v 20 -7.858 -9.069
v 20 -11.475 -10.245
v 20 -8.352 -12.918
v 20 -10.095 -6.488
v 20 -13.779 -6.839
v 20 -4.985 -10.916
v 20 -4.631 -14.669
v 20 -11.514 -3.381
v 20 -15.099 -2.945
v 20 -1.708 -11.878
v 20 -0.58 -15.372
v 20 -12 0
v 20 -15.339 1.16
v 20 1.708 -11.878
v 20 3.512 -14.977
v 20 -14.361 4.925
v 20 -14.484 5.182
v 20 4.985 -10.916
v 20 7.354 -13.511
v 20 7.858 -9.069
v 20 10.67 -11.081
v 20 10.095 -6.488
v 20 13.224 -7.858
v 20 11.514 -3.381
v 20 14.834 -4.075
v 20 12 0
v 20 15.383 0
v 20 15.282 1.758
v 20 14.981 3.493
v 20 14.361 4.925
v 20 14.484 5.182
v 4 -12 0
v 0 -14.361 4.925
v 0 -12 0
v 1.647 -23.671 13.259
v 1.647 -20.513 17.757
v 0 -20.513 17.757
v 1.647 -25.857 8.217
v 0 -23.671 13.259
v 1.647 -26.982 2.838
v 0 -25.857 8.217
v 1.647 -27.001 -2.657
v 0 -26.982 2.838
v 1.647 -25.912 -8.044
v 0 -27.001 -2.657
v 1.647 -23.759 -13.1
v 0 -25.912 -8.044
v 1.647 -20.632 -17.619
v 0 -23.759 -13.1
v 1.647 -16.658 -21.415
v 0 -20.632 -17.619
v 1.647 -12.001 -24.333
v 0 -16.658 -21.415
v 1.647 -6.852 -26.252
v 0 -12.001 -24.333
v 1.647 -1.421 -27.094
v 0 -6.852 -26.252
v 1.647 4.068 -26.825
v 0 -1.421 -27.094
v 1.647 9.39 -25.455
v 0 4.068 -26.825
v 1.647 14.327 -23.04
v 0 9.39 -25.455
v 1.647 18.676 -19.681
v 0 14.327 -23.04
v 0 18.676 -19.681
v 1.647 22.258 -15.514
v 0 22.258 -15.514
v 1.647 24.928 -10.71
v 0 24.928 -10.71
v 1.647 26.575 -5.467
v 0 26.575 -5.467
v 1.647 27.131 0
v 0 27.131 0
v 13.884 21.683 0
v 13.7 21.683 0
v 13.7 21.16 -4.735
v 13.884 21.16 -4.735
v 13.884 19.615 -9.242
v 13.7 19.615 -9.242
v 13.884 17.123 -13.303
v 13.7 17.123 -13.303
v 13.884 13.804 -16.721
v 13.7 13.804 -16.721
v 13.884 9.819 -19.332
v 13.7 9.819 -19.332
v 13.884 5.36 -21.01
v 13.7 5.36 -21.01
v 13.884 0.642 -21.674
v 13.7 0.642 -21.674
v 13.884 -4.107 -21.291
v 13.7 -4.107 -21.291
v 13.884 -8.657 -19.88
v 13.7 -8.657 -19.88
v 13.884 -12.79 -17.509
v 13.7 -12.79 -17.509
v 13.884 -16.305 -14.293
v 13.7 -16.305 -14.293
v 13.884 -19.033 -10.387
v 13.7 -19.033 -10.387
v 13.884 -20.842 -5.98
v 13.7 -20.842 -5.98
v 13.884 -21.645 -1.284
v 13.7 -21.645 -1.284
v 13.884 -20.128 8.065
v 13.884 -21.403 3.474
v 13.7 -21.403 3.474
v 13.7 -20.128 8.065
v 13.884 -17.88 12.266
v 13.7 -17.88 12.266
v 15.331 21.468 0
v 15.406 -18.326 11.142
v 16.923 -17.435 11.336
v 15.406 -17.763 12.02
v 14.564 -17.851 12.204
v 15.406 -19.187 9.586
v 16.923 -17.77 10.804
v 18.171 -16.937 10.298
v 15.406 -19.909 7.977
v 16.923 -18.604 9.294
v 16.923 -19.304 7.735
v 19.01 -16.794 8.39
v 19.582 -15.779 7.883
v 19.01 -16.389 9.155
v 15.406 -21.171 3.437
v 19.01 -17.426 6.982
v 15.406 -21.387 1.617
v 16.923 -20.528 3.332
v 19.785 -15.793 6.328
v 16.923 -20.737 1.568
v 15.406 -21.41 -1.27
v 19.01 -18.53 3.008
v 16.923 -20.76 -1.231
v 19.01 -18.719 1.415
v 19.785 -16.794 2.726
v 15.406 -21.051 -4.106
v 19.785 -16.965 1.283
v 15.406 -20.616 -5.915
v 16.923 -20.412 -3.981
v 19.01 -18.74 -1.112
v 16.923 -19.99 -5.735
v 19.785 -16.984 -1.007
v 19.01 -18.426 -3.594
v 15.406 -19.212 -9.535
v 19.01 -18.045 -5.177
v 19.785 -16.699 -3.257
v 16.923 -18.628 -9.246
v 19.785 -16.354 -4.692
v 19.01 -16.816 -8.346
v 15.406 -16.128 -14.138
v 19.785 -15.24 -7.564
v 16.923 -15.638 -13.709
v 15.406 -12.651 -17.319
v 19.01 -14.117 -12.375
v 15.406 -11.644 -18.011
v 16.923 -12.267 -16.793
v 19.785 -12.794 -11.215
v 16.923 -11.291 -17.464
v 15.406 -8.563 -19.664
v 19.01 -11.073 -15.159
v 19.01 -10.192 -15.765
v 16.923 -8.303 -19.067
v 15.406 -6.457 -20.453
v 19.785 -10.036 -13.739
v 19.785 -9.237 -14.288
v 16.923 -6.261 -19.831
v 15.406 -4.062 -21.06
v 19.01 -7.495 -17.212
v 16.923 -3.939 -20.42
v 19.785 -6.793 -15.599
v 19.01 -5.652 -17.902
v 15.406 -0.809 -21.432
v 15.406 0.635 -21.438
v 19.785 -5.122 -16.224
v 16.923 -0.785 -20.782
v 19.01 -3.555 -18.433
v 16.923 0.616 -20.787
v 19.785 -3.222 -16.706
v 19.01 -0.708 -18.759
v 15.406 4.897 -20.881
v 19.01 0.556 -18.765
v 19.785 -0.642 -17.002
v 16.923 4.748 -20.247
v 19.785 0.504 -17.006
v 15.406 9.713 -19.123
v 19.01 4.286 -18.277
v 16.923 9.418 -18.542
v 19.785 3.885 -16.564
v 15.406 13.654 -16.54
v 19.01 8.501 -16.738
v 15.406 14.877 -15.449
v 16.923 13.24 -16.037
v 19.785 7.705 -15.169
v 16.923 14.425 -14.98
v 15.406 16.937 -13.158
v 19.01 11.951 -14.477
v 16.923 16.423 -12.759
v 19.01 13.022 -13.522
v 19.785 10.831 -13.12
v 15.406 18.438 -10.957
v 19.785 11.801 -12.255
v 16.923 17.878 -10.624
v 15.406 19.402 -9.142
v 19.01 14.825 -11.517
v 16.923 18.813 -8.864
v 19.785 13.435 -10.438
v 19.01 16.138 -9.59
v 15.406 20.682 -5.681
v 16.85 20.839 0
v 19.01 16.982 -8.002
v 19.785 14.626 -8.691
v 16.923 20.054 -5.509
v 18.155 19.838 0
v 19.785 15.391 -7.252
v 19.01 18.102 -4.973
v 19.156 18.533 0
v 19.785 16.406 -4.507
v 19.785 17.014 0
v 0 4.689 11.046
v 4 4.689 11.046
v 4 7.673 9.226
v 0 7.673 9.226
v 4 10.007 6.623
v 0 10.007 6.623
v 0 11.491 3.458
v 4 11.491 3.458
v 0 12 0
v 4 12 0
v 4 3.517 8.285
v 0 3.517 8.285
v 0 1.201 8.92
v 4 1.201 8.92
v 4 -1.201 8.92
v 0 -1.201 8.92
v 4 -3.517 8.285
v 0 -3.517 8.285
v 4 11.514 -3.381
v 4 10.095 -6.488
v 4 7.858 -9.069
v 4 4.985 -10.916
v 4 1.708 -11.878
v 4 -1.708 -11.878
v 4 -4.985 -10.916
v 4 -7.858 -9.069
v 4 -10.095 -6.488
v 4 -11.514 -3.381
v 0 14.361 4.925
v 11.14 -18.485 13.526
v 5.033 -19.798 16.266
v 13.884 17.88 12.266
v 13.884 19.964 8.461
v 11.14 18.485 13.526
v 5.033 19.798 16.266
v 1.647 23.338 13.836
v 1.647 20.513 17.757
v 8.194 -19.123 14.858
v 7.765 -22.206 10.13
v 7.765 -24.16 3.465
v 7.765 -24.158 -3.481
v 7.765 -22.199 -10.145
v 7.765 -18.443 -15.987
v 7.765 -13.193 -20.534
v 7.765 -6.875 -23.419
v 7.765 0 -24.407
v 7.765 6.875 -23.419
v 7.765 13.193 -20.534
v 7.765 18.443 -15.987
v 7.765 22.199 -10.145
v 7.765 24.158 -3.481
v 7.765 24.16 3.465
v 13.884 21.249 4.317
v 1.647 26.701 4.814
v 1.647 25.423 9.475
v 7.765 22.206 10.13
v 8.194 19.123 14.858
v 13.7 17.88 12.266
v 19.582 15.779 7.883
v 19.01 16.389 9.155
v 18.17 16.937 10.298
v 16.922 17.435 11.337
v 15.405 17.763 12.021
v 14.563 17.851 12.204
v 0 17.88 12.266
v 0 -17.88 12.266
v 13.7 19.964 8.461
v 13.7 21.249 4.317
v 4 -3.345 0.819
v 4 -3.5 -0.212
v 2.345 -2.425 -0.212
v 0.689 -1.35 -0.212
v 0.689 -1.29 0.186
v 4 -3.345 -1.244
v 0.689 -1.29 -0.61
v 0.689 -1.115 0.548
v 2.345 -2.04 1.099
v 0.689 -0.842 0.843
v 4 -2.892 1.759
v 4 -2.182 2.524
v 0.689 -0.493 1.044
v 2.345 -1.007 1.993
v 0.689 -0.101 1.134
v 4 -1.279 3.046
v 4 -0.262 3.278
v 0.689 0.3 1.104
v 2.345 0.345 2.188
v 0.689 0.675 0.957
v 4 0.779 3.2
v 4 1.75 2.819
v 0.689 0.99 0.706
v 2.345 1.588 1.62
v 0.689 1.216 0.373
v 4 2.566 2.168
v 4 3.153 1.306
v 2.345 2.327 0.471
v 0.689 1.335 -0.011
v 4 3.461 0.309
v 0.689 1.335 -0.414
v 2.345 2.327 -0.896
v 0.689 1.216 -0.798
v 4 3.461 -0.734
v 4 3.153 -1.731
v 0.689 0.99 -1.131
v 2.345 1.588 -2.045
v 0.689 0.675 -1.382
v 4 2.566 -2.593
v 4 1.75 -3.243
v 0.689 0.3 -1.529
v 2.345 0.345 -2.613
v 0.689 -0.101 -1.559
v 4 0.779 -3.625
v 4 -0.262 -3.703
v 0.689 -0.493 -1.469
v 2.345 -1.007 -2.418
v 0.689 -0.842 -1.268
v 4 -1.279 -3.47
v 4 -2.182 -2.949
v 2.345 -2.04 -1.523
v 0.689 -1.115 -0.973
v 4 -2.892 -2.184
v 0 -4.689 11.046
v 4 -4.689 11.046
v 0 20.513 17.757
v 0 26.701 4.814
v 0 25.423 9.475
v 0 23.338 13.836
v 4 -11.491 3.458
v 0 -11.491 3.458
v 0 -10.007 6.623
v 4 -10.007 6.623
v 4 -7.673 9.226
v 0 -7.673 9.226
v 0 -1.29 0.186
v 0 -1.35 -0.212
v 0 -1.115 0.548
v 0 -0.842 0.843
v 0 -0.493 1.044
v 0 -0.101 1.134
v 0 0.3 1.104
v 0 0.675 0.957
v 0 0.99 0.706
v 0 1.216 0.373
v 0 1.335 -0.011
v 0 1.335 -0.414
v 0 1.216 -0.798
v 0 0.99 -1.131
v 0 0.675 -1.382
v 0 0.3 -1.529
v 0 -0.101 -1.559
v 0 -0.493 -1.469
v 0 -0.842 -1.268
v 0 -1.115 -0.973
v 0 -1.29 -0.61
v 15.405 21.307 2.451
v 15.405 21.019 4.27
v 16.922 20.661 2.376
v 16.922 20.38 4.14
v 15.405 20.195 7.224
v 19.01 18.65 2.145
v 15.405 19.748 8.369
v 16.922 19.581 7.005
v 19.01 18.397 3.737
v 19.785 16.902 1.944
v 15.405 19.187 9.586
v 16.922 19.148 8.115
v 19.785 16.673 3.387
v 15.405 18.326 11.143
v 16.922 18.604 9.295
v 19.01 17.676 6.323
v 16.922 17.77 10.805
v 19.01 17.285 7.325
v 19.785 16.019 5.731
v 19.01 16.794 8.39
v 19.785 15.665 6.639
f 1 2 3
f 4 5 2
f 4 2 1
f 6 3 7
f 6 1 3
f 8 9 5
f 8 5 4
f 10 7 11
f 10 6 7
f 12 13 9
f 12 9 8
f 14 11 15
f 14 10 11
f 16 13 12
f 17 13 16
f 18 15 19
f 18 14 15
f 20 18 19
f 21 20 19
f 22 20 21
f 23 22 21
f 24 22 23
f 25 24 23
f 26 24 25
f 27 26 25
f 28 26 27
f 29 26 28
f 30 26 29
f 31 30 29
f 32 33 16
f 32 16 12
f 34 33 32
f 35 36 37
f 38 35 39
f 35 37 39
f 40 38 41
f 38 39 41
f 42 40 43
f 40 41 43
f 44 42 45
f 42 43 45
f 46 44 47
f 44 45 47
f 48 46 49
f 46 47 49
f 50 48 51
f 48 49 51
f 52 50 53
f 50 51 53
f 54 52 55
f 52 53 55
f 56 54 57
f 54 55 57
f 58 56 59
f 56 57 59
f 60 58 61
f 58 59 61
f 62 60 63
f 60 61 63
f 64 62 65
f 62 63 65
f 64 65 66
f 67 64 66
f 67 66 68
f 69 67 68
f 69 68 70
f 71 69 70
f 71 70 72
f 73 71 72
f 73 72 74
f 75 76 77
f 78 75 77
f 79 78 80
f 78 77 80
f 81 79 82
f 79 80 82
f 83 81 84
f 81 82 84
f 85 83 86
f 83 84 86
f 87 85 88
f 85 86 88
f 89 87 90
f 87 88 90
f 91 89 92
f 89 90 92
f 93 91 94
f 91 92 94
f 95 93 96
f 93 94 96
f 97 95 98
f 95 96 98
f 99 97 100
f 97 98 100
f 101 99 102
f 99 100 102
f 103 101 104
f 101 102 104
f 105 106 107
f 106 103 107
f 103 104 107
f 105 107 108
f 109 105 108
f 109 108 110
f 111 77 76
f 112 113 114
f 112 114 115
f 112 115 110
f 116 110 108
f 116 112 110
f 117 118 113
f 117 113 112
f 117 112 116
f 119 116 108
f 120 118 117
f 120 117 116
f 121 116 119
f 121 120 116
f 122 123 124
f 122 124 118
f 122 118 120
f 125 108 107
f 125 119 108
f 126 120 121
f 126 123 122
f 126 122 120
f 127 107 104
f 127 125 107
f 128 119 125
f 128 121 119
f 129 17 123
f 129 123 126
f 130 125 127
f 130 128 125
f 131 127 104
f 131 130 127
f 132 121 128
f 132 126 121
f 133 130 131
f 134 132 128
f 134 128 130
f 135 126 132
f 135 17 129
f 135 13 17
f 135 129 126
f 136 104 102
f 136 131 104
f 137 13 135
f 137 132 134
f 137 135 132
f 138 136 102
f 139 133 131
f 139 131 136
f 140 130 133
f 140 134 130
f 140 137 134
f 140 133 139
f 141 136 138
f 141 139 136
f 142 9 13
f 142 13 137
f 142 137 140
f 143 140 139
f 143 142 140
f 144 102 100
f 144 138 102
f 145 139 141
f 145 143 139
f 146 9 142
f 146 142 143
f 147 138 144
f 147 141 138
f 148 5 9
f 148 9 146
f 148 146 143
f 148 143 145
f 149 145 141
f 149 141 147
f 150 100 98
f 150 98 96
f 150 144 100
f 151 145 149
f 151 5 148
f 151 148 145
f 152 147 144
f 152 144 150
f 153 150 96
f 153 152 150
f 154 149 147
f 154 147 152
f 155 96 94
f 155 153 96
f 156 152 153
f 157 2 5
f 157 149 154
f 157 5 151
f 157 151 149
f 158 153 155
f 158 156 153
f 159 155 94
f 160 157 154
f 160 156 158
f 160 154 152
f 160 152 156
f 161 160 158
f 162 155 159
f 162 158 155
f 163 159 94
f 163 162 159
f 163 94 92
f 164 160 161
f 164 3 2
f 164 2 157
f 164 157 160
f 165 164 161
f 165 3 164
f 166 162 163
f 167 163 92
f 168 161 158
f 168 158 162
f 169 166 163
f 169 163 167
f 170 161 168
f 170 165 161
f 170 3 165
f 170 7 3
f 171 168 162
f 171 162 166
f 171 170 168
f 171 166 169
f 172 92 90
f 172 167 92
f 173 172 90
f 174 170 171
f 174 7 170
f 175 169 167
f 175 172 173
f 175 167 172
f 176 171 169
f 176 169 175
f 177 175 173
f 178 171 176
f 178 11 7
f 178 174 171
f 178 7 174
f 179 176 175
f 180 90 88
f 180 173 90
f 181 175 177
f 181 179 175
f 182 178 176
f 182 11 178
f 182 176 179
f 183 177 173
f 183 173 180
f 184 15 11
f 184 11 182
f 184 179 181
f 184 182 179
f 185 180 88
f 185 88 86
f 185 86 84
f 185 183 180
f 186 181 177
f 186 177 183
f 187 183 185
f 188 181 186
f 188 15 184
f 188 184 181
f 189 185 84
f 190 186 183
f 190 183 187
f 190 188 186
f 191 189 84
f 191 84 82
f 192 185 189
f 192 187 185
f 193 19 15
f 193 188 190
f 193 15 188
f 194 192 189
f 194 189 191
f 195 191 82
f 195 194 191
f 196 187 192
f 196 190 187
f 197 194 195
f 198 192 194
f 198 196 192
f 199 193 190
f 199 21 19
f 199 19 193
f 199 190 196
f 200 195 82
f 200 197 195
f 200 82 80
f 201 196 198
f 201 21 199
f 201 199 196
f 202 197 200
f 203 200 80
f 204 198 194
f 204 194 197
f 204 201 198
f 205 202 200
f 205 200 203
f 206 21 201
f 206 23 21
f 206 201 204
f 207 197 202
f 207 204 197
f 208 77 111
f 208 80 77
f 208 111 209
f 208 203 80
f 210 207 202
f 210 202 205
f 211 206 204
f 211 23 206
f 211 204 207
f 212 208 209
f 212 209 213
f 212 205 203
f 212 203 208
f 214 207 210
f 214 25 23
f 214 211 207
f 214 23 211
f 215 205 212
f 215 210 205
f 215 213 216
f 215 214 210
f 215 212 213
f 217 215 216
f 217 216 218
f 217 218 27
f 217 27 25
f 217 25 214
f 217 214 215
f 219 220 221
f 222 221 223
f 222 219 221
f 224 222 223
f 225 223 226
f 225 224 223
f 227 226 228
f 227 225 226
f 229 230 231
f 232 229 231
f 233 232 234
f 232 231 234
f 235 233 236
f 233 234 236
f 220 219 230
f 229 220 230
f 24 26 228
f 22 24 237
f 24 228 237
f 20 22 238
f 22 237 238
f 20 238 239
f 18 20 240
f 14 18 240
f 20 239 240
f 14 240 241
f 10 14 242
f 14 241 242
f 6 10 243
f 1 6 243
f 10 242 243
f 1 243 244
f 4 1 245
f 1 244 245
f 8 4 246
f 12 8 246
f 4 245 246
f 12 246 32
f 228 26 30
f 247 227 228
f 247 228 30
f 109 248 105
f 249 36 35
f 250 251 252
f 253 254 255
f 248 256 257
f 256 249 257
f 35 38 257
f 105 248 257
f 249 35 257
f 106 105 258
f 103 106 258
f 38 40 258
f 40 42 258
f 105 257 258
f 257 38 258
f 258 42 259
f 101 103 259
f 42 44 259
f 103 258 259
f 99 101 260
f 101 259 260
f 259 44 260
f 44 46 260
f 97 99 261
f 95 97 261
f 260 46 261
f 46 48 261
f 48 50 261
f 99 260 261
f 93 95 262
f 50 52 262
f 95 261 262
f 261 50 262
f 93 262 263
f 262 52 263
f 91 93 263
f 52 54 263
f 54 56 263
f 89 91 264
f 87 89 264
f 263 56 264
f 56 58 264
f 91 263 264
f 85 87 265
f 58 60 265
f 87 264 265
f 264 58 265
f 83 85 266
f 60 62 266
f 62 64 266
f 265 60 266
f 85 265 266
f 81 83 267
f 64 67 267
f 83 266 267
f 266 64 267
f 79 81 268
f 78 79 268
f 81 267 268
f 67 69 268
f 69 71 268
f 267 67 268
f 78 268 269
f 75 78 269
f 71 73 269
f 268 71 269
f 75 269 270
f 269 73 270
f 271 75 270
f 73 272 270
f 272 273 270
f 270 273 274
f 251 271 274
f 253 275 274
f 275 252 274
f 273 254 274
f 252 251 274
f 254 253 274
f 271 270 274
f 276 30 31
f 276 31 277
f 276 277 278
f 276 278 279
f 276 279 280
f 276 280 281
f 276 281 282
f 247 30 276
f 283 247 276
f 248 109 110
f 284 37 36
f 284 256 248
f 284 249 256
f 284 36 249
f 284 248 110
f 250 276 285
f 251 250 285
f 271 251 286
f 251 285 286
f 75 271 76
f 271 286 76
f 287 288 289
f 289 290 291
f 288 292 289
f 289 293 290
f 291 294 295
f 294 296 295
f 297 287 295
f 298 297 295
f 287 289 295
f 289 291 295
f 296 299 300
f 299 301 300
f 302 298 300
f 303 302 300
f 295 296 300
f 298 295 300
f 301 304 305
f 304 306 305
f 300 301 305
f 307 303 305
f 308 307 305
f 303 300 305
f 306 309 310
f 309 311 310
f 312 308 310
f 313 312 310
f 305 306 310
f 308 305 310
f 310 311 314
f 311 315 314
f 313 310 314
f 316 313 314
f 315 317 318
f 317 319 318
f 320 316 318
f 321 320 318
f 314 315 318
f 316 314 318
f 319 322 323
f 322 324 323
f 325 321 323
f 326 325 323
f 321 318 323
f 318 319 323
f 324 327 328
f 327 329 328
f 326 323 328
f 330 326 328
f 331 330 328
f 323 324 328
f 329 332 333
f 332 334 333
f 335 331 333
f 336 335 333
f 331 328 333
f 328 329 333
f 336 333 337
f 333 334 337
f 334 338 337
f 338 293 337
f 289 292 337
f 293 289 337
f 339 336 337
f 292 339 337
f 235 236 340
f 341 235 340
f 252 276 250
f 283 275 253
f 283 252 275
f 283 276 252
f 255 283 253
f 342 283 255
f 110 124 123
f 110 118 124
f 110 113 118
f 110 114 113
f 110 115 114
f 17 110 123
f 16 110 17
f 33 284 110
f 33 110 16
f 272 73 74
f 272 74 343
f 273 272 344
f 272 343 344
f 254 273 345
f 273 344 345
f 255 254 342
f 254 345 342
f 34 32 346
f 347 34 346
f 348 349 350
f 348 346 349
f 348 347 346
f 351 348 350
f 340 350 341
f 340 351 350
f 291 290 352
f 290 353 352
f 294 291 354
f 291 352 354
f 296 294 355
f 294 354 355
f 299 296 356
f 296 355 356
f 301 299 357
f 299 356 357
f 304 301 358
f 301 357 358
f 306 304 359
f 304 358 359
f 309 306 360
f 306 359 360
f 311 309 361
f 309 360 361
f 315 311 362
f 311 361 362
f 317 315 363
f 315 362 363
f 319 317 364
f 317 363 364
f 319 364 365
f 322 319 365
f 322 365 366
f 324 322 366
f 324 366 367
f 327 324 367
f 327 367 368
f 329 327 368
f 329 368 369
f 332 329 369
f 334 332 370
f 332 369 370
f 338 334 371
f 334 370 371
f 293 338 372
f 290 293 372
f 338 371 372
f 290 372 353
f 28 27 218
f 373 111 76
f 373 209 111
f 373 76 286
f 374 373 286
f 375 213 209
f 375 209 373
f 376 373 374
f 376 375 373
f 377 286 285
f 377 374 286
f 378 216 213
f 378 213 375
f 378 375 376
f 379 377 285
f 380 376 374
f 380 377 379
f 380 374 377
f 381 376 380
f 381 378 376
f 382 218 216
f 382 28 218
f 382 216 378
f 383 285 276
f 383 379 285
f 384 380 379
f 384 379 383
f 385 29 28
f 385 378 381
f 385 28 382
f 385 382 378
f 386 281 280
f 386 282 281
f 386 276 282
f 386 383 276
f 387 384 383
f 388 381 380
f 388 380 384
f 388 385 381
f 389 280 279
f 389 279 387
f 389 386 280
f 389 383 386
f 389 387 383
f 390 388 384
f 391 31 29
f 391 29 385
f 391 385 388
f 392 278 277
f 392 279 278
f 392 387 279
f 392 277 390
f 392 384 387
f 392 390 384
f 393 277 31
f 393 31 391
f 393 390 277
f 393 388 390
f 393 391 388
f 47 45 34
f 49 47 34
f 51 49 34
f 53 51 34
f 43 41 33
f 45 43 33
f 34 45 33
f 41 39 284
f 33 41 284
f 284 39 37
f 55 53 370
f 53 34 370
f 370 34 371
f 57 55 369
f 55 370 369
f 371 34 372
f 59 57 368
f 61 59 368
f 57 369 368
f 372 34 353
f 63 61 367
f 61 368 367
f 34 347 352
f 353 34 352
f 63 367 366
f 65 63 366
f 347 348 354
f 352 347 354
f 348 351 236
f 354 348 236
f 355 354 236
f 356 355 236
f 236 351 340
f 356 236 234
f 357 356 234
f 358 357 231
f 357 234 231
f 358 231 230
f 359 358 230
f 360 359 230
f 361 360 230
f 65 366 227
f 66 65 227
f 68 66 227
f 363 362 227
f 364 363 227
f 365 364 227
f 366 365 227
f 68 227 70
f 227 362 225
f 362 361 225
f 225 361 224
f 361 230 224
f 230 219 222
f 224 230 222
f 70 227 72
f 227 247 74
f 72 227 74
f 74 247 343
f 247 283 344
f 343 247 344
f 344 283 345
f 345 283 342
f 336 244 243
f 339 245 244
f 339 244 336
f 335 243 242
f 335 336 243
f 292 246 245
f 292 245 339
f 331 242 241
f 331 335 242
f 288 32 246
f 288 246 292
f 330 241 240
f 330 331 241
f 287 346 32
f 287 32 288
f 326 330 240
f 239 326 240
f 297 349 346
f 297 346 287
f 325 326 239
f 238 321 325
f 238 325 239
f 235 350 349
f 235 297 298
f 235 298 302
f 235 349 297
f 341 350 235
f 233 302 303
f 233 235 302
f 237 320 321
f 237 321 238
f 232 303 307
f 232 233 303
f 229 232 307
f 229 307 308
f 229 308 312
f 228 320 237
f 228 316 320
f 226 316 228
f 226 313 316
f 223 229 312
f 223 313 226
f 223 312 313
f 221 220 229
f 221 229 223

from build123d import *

# Parameters (mm, degrees)
F1_DEPTH       = 20
F2_DEPTH       = 20
F3_R           = 6.3
F4_DEPTH       = 14
F5_S5_R        = 21.6830909865
F5_T6_DEPTH    = 40
F6_DEPTH       = 4
F7_DEPTH       = 25
F9_D           = 2.7
F9_DEPTH       = 12
F9_CSINK_D     = 7
F9_CSINK_ANGLE = 66
F9_TIP         = 0.8111618357


# Not quite as in the source:
# - a fillet or chamfer that OpenCascade refuses, or shapes differently, is made with other operations: its cross-section is extruded or revolved along the edge and cut away or added


with BuildPart() as f1:
    # F0 (on Right) → F1 (new body)
    with BuildSketch(Plane.YZ):
        with BuildLine():
            ThreePointArc((4.6887735419, 11.0460582414), (10.0066298648, 6.6232438237), (12, 0))
            Line((12, 0), (14.3613430429, 4.925409334))
            ThreePointArc((14.3613430429, 4.925409334), (0, 15.1824843522), (-14.3613430429, 4.925409334))
            Line((-14.3613430429, 4.925409334), (-12, 0))
            ThreePointArc((-12, 0), (-10.0066298648, 6.6232438237), (-4.6887735419, 11.0460582414))
            ThreePointArc((-4.6887735419, 11.0460582414), (0, 12), (4.6887735419, 11.0460582414))
        make_face()
        with BuildLine():
            Line((14.3613430429, 4.925409334), (12, 0))
            ThreePointArc((12, 0), (0, -12), (-12, 0))
            Line((-12, 0), (-14.3613430429, 4.925409334))
            ThreePointArc((-14.3613430429, 4.925409334), (-2.4966943224, -14.9757920847), (15.1824843522, 0))
            ThreePointArc((15.1824843522, 0), (14.9757920847, 2.4966943224), (14.3613430429, 4.925409334))
        make_face()
    extrude(amount=F1_DEPTH)

    # F0 (on Right) → F2 (join)
    with BuildSketch(Plane.YZ):
        with BuildLine():
            ThreePointArc((-14.3613430429, 4.925409334), (0, 15.1824843522), (14.3613430429, 4.925409334))
            Line((14.3613430429, 4.925409334), (17.8804215677, 12.2656821778))
            ThreePointArc((17.8804215677, 12.2656821778), (13.0689294726, 17.30200905), (6.9088656071, 20.5529562533))
            Line((6.9088656071, 20.5529562533), (-6.9088656071, 20.5529562533))
            ThreePointArc((-6.9088656071, 20.5529562533), (-13.0689294726, 17.30200905), (-17.8804215677, 12.2656821778))
            Line((-17.8804215677, 12.2656821778), (-14.3613430429, 4.925409334))
        make_face()
        with BuildLine():
            Line((17.8804215677, 12.2656821778), (14.3613430429, 4.925409334))
            ThreePointArc((14.3613430429, 4.925409334), (14.9757920847, 2.4966943224), (15.1824843522, 0))
            ThreePointArc((15.1824843522, 0), (-2.4966943224, -14.9757920847), (-14.3613430429, 4.925409334))
            Line((-14.3613430429, 4.925409334), (-17.8804215677, 12.2656821778))
            ThreePointArc((-17.8804215677, 12.2656821778), (-6.4208109689, -20.710616148), (21.6830909865, 0))
            ThreePointArc((21.6830909865, 0), (20.710616148, 6.4208109689), (17.8804215677, 12.2656821778))
        make_face()
        with BuildLine():
            Line((-6.9088656071, 20.5529562533), (6.9088656071, 20.5529562533))
            ThreePointArc((6.9088656071, 20.5529562533), (0, 21.6830909865), (-6.9088656071, 20.5529562533))
        make_face()
    extrude(amount=F2_DEPTH)

    # F3
    f3_edges = [f1.edges().sort_by_distance(p)[0] for p in [
        (20, -6.908866, -20.552956),
    ]]
    fillet(f3_edges, radius=F3_R)

    # F0 (on Right) → F4 (join)
    with BuildSketch(Plane.YZ):
        with BuildLine():
            ThreePointArc((6.9088656071, 20.5529562533), (13.0689294726, 17.30200905), (17.8804215677, 12.2656821778))
            Line((17.8804215677, 12.2656821778), (20.5131543573, 17.7571700385))
            ThreePointArc((20.5131543573, 17.7571700385), (19.1631742939, 19.2062318127), (17.7110863222, 20.5529562533))
            Line((17.7110863222, 20.5529562533), (6.9088656071, 20.5529562533))
        make_face()
        with BuildLine():
            ThreePointArc((-6.9088656071, 20.5529562533), (0, 21.6830909865), (6.9088656071, 20.5529562533))
            Line((6.9088656071, 20.5529562533), (17.7110863222, 20.5529562533))
            ThreePointArc((17.7110863222, 20.5529562533), (0, 27.1312843312), (-17.7110863222, 20.5529562533))
            Line((-17.7110863222, 20.5529562533), (-6.9088656071, 20.5529562533))
        make_face()
        with BuildLine():
            Line((-20.5131543573, 17.7571700385), (-17.8804215677, 12.2656821778))
            ThreePointArc((-17.8804215677, 12.2656821778), (-13.0689294726, 17.30200905), (-6.9088656071, 20.5529562533))
            Line((-6.9088656071, 20.5529562533), (-17.7110863222, 20.5529562533))
            ThreePointArc((-17.7110863222, 20.5529562533), (-19.1631742939, 19.2062318127), (-20.5131543573, 17.7571700385))
        make_face()
        with BuildLine():
            Line((20.5131543573, 17.7571700385), (17.8804215677, 12.2656821778))
            ThreePointArc((17.8804215677, 12.2656821778), (20.710616148, 6.4208109689), (21.6830909865, 0))
            ThreePointArc((21.6830909865, 0), (-6.4208109689, -20.710616148), (-17.8804215677, 12.2656821778))
            Line((-17.8804215677, 12.2656821778), (-20.5131543573, 17.7571700385))
            ThreePointArc((-20.5131543573, 17.7571700385), (-9.4751877571, -25.4229700552), (27.1312843312, 0))
            ThreePointArc((27.1312843312, 0), (25.4229700552, 9.4751877571), (20.5131543573, 17.7571700385))
        make_face()
    extrude(amount=F4_DEPTH)

    # F5: chamfer of 5.5 x 12.3532022565 on 1 edges, made by hand


with BuildPart() as f5_tool2:
    # F5_s3 → F5_t4 (revolve)
    with BuildSketch(Plane(origin=(0, 0, 0), x_dir=(1, 0, 0), z_dir=(0, 0.6544905808, 0.7560701553))):
        Polygon((14, -21.6312843312), (1.6467977435, -27.1312843312), (14, -27.1312843312), align=None)
    revolve(axis=Axis((14, 0, 0), (1, 0, 0)))

    # F5_s5 → F5_t6 (cut, symmetric)
    with BuildSketch(Plane.YZ.offset(7.8)):
        Circle(F5_S5_R)
    extrude(amount=F5_T6_DEPTH, both=True, mode=Mode.SUBTRACT)


with BuildPart() as f1_1:
    add(f1.part)

    # F5_t1: cut F5_tool2
    add(f5_tool2.part, mode=Mode.SUBTRACT)

    # F0 (on Right) → F6 (join)
    with BuildSketch(Plane.YZ):
        with BuildLine():
            ThreePointArc((-12, 0), (0, -12), (12, 0))
            ThreePointArc((12, 0), (10.0066298648, 6.6232438237), (4.6887735419, 11.0460582414))
            Line((4.6887735419, 11.0460582414), (3.5165801564, 8.2845436811))
            ThreePointArc((3.5165801564, 8.2845436811), (7.5049723986, 4.9674328678), (9, 0))
            ThreePointArc((9, 0), (-4.9674328678, -7.5049723986), (-3.5165801564, 8.2845436811))
            Line((-3.5165801564, 8.2845436811), (-4.6887735419, 11.0460582414))
            ThreePointArc((-4.6887735419, 11.0460582414), (-10.0066298648, 6.6232438237), (-12, 0))
        make_face()
        with BuildLine():
            ThreePointArc((9, 0), (7.5049723986, 4.9674328678), (3.5165801564, 8.2845436811))
            Line((3.5165801564, 8.2845436811), (0, 0))
            Line((0, 0), (-3.5165801564, 8.2845436811))
            ThreePointArc((-3.5165801564, 8.2845436811), (-4.9674328678, -7.5049723986), (9, 0))
        make_face()
        with BuildLine():
            Line((0, 0), (3.5165801564, 8.2845436811))
            ThreePointArc((3.5165801564, 8.2845436811), (0, 9), (-3.5165801564, 8.2845436811))
            Line((-3.5165801564, 8.2845436811), (0, 0))
        make_face()
    extrude(amount=F6_DEPTH)

    # F0 (on Right) → F7 (cut)
    with BuildSketch(Plane.YZ):
        with BuildLine():
            ThreePointArc((4.6887735419, 11.0460582414), (10.0066298648, 6.6232438237), (12, 0))
            Line((12, 0), (14.3613430429, 4.925409334))
            ThreePointArc((14.3613430429, 4.925409334), (0, 15.1824843522), (-14.3613430429, 4.925409334))
            Line((-14.3613430429, 4.925409334), (-12, 0))
            ThreePointArc((-12, 0), (-10.0066298648, 6.6232438237), (-4.6887735419, 11.0460582414))
            ThreePointArc((-4.6887735419, 11.0460582414), (0, 12), (4.6887735419, 11.0460582414))
        make_face()
        with BuildLine():
            ThreePointArc((-14.3613430429, 4.925409334), (0, 15.1824843522), (14.3613430429, 4.925409334))
            Line((14.3613430429, 4.925409334), (17.8804215677, 12.2656821778))
            ThreePointArc((17.8804215677, 12.2656821778), (13.0689294726, 17.30200905), (6.9088656071, 20.5529562533))
            Line((6.9088656071, 20.5529562533), (-6.9088656071, 20.5529562533))
            ThreePointArc((-6.9088656071, 20.5529562533), (-13.0689294726, 17.30200905), (-17.8804215677, 12.2656821778))
            Line((-17.8804215677, 12.2656821778), (-14.3613430429, 4.925409334))
        make_face()
        with BuildLine():
            Line((-6.9088656071, 20.5529562533), (6.9088656071, 20.5529562533))
            ThreePointArc((6.9088656071, 20.5529562533), (0, 21.6830909865), (-6.9088656071, 20.5529562533))
        make_face()
        with BuildLine():
            ThreePointArc((-6.9088656071, 20.5529562533), (0, 21.6830909865), (6.9088656071, 20.5529562533))
            Line((6.9088656071, 20.5529562533), (17.7110863222, 20.5529562533))
            ThreePointArc((17.7110863222, 20.5529562533), (0, 27.1312843312), (-17.7110863222, 20.5529562533))
            Line((-17.7110863222, 20.5529562533), (-6.9088656071, 20.5529562533))
        make_face()
        with BuildLine():
            Line((-20.5131543573, 17.7571700385), (-17.8804215677, 12.2656821778))
            ThreePointArc((-17.8804215677, 12.2656821778), (-13.0689294726, 17.30200905), (-6.9088656071, 20.5529562533))
            Line((-6.9088656071, 20.5529562533), (-17.7110863222, 20.5529562533))
            ThreePointArc((-17.7110863222, 20.5529562533), (-19.1631742939, 19.2062318127), (-20.5131543573, 17.7571700385))
        make_face()
        with BuildLine():
            ThreePointArc((6.9088656071, 20.5529562533), (13.0689294726, 17.30200905), (17.8804215677, 12.2656821778))
            Line((17.8804215677, 12.2656821778), (20.5131543573, 17.7571700385))
            ThreePointArc((20.5131543573, 17.7571700385), (19.1631742939, 19.2062318127), (17.7110863222, 20.5529562533))
            Line((17.7110863222, 20.5529562533), (6.9088656071, 20.5529562533))
        make_face()
    extrude(amount=F7_DEPTH, mode=Mode.SUBTRACT)

    # F9
    with Locations(Plane.YZ.offset(4)):
        with Locations((0, -0.2123973536)):
            CounterSinkHole(F9_D / 2, F9_CSINK_D / 2, depth=F9_DEPTH, counter_sink_angle=F9_CSINK_ANGLE)
            with Locations((0, 0, -(F9_DEPTH + F9_TIP / 2))):  # 118° drill point
                Cone(0, F9_D / 2, F9_TIP, mode=Mode.SUBTRACT)


solid = f1_1.part
